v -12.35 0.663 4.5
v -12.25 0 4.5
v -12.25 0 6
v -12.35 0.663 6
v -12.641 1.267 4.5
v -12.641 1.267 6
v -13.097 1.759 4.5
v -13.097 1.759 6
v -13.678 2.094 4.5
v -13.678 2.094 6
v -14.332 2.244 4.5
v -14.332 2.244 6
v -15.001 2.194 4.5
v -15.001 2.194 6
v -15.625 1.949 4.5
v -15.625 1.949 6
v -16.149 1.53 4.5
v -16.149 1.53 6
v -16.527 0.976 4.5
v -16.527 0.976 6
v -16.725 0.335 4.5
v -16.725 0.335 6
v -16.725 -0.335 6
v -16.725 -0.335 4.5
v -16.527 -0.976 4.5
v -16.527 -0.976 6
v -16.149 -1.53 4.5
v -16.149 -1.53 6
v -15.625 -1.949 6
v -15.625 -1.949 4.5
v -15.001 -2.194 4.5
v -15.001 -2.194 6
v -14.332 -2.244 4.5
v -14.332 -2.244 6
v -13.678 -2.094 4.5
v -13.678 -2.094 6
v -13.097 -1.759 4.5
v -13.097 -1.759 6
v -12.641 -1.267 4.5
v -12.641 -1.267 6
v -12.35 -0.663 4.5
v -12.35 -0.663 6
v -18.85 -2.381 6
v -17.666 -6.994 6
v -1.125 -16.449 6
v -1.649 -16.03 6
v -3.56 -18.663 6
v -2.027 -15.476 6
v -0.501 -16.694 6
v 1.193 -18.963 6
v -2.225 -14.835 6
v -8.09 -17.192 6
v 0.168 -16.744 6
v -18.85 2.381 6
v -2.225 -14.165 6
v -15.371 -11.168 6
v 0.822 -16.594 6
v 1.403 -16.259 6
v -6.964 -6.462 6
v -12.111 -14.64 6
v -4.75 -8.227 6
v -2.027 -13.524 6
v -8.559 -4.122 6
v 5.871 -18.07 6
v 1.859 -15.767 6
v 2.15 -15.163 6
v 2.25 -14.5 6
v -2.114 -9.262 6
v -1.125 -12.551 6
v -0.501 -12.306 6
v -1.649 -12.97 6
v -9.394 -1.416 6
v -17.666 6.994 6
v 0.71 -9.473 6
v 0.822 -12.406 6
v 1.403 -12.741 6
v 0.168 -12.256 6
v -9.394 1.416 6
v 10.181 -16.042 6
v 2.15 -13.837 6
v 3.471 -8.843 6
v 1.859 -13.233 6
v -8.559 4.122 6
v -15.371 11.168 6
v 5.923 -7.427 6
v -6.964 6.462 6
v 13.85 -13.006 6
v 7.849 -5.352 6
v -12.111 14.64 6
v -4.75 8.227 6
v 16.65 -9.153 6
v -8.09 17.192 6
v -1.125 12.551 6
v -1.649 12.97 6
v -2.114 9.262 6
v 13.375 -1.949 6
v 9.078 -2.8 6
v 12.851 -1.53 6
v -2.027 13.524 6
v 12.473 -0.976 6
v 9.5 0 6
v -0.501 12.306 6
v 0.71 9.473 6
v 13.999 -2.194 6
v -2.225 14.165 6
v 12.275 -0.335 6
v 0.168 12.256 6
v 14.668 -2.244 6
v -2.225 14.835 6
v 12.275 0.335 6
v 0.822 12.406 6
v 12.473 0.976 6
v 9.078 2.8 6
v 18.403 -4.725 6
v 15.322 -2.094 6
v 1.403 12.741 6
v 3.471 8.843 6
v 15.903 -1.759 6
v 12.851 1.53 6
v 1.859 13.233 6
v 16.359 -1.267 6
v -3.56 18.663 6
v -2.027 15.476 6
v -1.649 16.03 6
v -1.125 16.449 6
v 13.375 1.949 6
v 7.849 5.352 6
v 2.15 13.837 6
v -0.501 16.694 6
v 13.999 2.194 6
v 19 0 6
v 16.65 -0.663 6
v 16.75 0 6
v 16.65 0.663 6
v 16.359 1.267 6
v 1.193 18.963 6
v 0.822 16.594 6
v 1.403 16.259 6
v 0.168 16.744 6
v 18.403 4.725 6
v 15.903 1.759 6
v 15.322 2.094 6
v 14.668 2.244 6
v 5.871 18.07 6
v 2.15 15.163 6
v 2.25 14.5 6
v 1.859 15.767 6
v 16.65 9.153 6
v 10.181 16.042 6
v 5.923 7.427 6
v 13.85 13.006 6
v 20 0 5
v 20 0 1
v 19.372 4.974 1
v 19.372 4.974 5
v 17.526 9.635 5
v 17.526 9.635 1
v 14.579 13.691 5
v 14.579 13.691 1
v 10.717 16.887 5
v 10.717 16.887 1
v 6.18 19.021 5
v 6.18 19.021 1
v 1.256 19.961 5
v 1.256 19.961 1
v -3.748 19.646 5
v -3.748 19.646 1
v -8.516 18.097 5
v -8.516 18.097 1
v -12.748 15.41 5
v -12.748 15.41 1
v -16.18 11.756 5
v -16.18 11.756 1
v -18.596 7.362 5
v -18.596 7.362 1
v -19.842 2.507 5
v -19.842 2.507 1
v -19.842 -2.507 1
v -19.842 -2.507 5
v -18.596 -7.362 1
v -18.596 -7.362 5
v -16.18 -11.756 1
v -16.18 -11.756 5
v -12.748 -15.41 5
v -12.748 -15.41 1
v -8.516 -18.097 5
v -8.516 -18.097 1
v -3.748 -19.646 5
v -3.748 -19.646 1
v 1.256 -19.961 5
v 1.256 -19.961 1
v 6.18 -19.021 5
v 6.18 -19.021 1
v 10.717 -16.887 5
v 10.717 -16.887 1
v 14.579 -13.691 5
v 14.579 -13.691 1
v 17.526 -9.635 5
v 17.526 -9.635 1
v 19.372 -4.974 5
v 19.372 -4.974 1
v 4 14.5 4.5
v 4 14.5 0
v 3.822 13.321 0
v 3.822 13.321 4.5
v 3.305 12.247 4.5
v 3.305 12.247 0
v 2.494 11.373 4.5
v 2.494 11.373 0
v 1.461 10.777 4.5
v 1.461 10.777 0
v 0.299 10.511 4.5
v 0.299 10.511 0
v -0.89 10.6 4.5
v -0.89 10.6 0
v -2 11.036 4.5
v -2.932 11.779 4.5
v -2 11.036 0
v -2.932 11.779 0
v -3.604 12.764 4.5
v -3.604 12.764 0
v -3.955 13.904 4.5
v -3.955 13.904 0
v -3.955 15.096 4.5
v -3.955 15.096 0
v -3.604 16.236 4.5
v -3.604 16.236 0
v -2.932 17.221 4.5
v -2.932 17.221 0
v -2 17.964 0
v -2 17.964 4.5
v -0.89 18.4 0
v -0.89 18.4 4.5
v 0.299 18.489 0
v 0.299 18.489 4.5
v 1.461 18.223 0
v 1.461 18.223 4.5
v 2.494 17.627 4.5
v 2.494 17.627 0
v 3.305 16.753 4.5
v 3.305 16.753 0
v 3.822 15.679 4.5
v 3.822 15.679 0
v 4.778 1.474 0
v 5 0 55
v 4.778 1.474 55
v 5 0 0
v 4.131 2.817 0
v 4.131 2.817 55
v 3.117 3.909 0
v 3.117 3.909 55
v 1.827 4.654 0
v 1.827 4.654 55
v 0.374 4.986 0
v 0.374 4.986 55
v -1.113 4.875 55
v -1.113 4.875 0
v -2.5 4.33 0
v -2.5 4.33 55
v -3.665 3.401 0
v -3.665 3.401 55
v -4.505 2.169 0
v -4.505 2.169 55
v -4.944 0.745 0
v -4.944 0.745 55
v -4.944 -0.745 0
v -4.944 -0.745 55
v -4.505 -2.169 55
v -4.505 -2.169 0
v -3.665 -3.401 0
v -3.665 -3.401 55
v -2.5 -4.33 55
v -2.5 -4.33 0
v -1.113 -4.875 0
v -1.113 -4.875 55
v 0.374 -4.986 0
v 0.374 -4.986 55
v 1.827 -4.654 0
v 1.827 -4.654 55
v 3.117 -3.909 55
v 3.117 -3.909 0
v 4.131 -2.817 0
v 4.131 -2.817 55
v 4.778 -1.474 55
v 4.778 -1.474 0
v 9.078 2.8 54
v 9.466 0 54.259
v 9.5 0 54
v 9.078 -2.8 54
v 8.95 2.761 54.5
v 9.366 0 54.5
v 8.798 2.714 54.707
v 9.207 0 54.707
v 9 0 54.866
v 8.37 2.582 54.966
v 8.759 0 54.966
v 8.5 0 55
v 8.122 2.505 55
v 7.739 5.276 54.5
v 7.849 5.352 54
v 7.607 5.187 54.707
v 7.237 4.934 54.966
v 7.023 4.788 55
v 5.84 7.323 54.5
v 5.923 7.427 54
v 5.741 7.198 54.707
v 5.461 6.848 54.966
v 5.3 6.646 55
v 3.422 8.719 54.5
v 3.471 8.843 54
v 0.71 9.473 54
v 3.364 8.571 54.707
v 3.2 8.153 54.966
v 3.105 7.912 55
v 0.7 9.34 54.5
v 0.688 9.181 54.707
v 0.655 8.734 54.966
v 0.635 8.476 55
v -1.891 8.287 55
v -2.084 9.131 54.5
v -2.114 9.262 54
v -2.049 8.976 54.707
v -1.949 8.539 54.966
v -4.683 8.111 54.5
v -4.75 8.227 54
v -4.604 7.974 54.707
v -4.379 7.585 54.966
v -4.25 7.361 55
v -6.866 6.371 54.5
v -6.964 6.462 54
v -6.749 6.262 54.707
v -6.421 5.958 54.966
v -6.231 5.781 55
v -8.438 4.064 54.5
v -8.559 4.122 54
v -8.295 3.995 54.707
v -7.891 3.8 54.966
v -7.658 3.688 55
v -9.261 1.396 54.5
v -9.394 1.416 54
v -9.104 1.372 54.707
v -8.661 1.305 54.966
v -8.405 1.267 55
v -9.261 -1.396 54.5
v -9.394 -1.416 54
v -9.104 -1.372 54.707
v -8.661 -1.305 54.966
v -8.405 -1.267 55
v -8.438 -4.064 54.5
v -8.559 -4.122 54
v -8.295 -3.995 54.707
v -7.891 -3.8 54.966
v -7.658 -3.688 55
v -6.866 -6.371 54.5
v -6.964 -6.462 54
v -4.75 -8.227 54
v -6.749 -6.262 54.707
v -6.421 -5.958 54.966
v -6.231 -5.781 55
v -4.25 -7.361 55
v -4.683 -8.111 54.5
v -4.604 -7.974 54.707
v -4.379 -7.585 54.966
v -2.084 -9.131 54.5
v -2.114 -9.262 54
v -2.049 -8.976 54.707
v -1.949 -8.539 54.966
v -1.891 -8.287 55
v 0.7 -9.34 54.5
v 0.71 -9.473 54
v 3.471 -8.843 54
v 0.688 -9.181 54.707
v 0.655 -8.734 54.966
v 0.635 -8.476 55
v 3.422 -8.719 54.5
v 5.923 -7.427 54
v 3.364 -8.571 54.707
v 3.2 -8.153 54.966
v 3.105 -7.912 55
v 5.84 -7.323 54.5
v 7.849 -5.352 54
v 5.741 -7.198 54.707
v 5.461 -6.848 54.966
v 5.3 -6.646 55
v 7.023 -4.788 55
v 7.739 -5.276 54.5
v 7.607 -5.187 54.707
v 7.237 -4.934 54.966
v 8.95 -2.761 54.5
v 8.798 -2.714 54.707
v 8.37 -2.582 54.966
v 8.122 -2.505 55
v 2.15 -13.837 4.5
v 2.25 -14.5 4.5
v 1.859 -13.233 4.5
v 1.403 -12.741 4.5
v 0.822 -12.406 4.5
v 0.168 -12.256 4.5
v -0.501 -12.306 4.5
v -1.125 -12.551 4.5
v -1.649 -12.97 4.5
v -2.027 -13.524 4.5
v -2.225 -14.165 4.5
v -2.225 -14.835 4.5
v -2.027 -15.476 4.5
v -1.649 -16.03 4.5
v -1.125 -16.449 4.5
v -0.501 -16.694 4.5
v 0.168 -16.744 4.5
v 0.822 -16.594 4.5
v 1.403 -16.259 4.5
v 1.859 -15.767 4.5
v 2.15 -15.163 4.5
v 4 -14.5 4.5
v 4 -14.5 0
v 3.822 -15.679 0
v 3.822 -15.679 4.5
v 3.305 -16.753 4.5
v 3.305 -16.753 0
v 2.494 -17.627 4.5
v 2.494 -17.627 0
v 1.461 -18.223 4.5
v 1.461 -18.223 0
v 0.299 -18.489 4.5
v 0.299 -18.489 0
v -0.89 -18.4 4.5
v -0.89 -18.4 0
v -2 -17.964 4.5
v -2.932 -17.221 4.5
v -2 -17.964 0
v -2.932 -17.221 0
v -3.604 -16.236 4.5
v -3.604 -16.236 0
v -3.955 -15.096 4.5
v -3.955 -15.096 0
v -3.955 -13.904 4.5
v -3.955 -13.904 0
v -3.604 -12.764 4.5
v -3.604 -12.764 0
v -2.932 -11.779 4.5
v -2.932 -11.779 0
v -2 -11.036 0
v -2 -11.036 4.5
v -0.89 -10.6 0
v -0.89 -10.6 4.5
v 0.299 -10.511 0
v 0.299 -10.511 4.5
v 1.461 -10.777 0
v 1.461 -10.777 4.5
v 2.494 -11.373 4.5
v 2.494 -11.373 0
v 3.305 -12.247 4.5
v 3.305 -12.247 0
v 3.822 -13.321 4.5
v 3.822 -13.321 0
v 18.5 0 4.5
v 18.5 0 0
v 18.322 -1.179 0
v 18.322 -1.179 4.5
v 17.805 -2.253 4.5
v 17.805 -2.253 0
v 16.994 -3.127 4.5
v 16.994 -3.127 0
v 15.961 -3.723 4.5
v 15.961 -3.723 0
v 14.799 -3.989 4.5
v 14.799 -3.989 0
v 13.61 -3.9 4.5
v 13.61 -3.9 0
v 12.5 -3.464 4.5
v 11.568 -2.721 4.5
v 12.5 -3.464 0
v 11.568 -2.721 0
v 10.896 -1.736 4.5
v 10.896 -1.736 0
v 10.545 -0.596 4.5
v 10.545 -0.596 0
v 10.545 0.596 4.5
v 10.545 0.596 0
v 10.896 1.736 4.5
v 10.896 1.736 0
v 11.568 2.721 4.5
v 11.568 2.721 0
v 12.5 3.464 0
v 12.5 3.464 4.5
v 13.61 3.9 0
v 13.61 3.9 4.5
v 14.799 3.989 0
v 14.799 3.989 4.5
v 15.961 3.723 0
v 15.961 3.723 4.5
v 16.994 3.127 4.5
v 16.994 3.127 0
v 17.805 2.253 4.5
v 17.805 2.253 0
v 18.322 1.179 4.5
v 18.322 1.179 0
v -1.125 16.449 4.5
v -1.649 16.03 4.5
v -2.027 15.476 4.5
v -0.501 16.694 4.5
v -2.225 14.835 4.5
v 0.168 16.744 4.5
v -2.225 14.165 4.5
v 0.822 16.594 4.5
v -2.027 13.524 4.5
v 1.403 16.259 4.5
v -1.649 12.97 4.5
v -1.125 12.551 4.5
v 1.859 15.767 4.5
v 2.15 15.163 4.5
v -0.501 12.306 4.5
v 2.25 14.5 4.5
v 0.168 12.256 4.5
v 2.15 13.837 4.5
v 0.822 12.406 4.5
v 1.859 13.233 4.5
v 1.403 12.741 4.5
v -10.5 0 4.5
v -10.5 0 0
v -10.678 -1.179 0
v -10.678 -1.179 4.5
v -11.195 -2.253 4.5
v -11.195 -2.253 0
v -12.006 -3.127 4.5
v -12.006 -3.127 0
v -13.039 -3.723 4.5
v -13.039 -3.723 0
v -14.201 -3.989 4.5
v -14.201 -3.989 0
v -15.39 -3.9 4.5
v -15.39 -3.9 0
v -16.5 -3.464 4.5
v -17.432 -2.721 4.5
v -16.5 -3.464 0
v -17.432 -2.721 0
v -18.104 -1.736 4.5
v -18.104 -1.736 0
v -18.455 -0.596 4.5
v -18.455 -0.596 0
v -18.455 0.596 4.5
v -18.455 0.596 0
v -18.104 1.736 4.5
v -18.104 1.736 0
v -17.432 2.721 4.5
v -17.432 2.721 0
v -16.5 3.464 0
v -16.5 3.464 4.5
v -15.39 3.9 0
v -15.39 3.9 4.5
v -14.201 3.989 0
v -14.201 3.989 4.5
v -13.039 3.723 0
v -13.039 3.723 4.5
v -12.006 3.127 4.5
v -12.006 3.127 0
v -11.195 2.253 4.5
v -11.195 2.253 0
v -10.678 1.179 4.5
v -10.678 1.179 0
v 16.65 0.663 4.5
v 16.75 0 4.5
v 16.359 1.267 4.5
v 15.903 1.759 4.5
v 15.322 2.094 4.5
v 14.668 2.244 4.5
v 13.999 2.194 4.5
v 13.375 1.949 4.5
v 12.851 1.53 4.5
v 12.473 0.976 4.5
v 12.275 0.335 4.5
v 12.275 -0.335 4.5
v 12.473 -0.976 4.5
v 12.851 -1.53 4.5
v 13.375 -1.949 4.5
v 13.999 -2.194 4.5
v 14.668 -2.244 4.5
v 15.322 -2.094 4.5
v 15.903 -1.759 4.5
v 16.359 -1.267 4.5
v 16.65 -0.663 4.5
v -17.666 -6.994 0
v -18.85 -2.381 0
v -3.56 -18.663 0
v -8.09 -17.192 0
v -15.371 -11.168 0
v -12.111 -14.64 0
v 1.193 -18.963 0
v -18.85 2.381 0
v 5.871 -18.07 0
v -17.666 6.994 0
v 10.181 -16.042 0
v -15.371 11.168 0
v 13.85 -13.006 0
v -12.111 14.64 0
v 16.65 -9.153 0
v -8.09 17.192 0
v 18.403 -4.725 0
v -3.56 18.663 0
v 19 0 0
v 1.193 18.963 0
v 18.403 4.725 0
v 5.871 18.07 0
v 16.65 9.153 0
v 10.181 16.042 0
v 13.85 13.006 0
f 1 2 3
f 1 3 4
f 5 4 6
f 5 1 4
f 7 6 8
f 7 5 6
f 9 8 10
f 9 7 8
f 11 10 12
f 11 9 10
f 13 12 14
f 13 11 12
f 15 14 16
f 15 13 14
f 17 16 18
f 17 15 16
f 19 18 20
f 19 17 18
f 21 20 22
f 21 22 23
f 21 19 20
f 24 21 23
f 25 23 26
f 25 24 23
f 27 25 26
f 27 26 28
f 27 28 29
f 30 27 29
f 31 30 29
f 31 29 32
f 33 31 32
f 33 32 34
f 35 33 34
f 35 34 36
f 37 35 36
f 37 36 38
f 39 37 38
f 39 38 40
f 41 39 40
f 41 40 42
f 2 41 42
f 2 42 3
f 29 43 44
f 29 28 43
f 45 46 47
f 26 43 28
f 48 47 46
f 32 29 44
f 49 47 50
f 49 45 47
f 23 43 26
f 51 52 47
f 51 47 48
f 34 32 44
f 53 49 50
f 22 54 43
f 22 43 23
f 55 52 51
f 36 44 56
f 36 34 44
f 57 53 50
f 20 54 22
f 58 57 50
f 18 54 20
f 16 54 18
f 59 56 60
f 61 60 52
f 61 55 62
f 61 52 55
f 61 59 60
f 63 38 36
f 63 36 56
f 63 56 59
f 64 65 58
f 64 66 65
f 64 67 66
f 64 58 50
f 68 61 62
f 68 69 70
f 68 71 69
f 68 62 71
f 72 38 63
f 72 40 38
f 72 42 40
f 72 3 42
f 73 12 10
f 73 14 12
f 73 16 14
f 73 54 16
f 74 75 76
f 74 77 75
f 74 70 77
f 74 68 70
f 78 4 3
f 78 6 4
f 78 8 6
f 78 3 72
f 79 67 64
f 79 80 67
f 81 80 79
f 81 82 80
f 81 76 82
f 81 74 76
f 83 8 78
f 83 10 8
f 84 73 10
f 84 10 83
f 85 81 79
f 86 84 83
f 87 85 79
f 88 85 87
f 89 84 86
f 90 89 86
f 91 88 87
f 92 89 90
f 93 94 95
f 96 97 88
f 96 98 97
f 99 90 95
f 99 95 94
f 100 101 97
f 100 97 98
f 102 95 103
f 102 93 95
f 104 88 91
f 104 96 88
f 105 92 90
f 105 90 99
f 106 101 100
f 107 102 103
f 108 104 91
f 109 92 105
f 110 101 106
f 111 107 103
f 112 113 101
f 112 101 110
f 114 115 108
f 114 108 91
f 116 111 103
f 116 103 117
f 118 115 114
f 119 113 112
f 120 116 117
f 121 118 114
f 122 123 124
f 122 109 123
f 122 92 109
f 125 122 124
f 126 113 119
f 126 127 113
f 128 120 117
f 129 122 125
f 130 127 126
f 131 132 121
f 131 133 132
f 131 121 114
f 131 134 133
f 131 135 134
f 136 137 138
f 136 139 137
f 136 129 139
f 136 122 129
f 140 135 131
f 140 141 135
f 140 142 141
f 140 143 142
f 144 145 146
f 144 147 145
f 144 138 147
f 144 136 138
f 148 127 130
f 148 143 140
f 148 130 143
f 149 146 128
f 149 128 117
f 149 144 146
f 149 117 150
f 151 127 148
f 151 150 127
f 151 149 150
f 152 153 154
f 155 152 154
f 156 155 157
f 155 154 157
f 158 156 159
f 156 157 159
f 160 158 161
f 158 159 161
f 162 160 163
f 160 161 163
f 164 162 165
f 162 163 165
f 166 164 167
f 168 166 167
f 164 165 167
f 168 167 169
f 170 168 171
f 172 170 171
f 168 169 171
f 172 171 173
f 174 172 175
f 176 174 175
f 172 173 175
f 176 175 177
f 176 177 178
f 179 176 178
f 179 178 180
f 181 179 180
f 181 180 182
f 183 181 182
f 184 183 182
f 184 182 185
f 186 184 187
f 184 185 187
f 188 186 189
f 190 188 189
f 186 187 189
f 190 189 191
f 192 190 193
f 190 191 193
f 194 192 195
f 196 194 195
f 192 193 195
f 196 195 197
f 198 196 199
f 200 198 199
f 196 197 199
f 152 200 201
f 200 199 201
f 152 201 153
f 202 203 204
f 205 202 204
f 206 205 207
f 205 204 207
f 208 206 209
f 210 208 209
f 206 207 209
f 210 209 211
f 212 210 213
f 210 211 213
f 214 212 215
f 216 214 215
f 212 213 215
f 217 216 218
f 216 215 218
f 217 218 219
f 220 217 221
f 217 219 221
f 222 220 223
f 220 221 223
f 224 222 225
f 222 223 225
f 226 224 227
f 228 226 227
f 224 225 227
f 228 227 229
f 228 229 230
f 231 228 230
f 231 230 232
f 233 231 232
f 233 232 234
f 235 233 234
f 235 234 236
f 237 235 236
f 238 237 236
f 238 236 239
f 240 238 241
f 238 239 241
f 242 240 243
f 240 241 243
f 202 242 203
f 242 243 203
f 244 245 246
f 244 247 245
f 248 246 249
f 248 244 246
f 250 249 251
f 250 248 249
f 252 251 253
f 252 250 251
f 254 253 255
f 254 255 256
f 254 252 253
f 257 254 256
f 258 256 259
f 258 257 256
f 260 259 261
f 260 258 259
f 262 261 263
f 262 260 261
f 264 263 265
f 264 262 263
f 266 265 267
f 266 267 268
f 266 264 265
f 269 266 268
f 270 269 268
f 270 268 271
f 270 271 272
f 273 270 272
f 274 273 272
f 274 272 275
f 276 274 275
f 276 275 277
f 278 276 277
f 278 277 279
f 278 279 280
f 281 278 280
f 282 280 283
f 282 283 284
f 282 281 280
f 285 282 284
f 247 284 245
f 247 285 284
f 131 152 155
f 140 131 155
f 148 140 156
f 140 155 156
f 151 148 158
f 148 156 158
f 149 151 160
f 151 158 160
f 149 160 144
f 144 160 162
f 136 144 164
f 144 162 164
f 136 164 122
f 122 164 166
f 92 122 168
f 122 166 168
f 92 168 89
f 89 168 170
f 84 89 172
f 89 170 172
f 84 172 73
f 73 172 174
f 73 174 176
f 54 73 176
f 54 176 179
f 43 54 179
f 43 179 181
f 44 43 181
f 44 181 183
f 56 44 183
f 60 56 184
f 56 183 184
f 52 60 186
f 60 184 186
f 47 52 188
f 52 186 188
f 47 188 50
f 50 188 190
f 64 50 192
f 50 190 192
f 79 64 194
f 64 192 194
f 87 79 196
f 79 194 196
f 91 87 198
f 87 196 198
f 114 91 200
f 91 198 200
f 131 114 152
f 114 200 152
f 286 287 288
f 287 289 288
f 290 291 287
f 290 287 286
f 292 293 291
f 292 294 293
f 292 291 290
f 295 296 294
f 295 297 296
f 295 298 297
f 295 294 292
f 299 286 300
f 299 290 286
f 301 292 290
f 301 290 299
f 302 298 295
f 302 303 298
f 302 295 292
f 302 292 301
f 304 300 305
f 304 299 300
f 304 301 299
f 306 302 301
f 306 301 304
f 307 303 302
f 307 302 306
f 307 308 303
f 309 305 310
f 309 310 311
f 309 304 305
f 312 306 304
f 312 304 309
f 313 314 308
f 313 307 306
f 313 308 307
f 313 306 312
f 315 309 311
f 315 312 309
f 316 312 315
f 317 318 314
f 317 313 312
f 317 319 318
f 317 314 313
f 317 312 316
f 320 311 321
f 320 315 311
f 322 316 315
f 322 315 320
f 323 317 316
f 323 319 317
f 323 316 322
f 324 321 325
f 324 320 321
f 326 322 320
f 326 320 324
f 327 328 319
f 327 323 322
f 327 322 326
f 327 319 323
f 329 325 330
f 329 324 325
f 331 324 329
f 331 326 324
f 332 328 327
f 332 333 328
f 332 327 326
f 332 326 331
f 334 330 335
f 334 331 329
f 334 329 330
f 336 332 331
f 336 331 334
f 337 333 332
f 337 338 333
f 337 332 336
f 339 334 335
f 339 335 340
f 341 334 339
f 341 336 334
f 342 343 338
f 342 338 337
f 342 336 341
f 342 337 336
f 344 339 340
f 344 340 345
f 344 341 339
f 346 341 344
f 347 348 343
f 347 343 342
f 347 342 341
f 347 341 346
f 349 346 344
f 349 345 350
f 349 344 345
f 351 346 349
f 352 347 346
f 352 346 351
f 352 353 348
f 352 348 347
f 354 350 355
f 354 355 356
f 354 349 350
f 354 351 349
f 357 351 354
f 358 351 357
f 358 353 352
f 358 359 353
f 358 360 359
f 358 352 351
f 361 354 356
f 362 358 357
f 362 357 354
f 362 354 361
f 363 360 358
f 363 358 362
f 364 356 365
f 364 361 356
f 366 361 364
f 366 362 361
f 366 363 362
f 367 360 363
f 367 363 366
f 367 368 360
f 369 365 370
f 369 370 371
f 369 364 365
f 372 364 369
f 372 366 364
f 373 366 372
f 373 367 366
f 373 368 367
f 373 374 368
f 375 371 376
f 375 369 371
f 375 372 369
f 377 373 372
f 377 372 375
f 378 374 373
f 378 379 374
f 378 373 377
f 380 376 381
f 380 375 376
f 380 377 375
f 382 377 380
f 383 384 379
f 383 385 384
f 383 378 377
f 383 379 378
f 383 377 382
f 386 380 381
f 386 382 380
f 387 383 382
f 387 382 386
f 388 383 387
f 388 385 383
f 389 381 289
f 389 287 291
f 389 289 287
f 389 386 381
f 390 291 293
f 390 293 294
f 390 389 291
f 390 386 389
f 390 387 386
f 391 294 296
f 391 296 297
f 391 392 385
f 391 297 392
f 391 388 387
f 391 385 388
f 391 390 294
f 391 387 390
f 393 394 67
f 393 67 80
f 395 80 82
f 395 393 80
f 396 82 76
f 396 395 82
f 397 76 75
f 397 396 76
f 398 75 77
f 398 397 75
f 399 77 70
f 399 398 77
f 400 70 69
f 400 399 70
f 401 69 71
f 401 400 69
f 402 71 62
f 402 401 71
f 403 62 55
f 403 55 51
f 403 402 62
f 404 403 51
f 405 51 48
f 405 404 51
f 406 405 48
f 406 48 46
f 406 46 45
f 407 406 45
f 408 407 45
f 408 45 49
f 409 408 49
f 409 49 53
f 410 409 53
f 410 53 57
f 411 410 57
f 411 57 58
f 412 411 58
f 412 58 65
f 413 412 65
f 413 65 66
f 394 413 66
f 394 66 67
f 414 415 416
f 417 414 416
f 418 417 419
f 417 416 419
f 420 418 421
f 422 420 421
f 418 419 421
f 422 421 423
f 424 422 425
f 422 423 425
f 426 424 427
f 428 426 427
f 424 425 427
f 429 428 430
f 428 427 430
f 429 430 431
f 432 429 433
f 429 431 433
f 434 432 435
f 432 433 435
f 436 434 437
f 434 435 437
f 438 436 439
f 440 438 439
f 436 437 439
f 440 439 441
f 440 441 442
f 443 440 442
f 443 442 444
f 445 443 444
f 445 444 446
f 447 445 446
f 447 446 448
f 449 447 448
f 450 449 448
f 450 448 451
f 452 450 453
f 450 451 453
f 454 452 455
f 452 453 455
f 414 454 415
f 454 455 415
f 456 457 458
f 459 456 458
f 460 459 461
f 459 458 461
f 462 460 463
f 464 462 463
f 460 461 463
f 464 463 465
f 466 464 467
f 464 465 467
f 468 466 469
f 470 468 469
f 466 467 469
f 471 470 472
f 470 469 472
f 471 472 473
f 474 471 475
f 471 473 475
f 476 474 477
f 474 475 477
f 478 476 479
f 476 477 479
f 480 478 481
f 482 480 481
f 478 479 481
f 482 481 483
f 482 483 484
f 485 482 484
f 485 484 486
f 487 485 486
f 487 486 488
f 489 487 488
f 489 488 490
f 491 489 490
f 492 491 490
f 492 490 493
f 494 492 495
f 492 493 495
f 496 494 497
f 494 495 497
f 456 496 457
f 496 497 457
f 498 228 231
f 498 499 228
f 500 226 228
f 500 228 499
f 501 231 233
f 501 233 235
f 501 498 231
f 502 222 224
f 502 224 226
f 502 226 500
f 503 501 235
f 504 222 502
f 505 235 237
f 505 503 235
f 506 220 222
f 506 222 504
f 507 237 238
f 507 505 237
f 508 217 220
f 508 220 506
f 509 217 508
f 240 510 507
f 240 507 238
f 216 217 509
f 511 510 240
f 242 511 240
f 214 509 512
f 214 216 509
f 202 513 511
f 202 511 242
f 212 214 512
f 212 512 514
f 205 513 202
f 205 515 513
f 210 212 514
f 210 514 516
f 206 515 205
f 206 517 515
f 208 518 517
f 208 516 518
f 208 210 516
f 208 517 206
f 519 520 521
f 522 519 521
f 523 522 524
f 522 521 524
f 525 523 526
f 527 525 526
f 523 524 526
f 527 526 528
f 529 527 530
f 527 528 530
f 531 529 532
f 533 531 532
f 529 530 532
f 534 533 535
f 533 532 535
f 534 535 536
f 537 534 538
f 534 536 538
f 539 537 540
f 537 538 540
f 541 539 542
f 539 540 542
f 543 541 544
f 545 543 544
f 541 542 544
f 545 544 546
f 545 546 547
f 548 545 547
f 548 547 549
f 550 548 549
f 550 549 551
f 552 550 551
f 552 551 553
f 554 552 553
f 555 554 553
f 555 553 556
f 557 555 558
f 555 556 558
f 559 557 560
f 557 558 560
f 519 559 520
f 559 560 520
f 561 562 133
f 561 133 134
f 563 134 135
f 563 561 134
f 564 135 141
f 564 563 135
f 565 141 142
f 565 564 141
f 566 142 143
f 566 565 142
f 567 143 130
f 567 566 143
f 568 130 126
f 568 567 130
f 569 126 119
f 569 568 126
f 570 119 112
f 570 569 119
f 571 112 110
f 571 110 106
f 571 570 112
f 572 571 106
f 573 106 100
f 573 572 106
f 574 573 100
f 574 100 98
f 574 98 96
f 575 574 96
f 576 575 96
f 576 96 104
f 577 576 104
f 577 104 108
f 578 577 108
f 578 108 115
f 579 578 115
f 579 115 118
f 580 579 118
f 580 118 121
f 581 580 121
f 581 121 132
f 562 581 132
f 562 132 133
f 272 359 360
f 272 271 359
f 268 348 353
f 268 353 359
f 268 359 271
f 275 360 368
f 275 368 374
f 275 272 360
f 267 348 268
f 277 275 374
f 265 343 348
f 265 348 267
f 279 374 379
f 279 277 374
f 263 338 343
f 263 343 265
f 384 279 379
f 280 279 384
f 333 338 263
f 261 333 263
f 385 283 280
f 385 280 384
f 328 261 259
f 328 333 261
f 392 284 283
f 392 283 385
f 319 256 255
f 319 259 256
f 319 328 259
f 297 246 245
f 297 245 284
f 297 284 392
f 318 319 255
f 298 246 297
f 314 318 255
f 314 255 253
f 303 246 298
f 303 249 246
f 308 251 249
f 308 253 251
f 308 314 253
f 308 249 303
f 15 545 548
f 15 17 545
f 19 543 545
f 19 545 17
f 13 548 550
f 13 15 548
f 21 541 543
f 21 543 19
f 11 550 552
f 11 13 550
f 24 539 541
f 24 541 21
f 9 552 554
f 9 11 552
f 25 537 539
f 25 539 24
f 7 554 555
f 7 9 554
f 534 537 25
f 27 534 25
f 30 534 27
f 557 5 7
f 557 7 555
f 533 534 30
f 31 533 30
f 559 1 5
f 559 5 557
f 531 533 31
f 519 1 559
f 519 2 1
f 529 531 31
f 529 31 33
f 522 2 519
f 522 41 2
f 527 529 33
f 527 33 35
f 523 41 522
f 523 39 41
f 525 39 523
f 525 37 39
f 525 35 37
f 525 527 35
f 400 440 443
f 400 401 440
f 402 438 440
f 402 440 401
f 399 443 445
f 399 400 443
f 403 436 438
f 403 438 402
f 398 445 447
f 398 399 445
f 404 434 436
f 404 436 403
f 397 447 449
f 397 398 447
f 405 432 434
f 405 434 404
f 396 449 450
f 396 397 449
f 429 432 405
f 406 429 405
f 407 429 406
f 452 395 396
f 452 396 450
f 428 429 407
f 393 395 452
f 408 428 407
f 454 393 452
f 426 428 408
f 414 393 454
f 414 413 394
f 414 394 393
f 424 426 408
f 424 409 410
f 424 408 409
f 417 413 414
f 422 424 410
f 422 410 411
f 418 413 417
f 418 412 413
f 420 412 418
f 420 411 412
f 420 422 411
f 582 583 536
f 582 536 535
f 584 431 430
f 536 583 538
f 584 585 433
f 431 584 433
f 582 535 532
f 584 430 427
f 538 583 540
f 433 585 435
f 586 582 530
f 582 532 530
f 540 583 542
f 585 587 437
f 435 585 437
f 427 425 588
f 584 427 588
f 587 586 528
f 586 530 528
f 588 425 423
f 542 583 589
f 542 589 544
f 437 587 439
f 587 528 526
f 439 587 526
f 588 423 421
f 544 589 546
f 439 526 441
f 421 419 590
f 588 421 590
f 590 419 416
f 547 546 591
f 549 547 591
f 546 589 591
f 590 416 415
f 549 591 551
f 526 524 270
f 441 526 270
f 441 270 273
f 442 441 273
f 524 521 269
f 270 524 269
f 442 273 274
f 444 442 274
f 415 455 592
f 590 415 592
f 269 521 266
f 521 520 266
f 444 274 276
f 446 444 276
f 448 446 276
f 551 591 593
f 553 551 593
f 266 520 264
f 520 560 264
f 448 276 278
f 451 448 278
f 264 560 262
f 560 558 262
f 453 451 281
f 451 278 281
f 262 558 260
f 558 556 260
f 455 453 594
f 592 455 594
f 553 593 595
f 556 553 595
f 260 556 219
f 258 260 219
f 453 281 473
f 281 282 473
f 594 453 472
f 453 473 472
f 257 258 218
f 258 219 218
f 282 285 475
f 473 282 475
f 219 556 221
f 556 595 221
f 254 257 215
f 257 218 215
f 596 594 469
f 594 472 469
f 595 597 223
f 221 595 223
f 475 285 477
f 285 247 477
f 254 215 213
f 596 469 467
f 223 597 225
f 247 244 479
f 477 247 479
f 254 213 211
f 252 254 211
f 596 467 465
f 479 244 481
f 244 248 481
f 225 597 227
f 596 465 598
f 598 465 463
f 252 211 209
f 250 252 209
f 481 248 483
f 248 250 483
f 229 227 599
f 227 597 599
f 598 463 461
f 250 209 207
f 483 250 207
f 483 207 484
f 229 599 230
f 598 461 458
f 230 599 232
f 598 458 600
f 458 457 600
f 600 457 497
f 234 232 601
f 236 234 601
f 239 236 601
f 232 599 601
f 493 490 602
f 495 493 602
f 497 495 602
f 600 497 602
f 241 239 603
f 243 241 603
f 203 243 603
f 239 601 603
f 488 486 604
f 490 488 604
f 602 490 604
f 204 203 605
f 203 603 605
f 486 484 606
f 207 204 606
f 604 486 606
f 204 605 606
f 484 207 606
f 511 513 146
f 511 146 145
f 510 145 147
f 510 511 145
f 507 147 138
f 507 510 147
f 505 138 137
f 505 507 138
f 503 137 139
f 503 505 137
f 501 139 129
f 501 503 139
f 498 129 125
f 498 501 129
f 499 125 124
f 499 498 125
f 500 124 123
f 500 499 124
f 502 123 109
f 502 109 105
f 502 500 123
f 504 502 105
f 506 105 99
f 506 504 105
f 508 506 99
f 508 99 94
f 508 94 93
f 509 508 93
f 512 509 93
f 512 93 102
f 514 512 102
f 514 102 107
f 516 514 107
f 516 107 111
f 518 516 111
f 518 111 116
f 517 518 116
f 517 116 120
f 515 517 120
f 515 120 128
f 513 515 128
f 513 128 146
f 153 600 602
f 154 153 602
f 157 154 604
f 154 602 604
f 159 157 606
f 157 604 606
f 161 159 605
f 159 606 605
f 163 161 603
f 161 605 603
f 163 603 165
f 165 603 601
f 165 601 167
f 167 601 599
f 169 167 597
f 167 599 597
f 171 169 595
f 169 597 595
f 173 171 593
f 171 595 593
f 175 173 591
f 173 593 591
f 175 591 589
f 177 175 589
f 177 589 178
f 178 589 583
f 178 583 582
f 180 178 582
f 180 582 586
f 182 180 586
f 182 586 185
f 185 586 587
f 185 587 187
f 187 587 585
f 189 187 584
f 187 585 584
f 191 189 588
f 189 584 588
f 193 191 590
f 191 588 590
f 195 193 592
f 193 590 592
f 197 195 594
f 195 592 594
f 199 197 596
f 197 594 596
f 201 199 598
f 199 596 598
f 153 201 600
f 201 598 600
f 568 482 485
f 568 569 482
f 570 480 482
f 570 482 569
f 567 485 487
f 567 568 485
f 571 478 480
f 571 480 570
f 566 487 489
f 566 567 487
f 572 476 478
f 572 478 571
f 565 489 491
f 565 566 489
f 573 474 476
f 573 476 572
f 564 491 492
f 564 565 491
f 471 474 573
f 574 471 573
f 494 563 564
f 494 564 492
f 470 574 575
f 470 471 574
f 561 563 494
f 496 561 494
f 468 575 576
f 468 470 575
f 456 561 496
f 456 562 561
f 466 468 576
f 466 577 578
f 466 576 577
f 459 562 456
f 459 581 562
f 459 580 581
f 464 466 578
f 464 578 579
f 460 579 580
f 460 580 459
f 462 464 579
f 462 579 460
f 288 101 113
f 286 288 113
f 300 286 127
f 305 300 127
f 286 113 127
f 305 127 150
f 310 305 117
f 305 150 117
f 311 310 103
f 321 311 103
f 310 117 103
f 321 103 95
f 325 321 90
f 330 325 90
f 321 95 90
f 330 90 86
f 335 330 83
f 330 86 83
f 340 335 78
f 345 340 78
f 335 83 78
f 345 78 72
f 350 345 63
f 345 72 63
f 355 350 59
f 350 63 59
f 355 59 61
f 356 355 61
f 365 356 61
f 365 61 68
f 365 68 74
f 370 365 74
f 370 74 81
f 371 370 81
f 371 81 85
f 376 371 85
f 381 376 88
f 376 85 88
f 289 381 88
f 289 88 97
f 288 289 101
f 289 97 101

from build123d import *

# Parameters (mm, degrees)
F0_R     = 20
F0_R_2   = 2.25
F0_R_3   = 5
F1_DEPTH = 6
F2_R     = 9.5
F2_R_2   = 5
F3_DEPTH = 49
F4_R     = 4
F5_DEPTH = 4.5
F6_SIZE  = 1
F7_R     = 1


with BuildPart() as f1:
    # F0 (on Top) → F1 (new body)
    with BuildSketch(Plane.XY):
        Circle(F0_R)
        with Locations((0, -14.5)):
            Circle(F0_R_2, mode=Mode.SUBTRACT)
        with Locations((-14.5, 0)):
            Circle(F0_R_2, mode=Mode.SUBTRACT)
        Circle(F0_R_3, mode=Mode.SUBTRACT)
        with Locations((14.5, 0)):
            Circle(F0_R_2, mode=Mode.SUBTRACT)
        with Locations((0, 14.5)):
            Circle(F0_R_2, mode=Mode.SUBTRACT)
    extrude(amount=F1_DEPTH)

    # F2 (on face) → F3 (join)
    with BuildSketch(Plane.XY.offset(6)):
        Circle(F2_R)
        Circle(F2_R_2, mode=Mode.SUBTRACT)
    extrude(amount=F3_DEPTH)

    # F4 (on face) → F5 (cut)
    with BuildSketch(Plane(origin=(0, 0, 0), x_dir=(1, 0, 0), z_dir=(0, 0, -1))):
        with Locations((0, 14.5)):
            Circle(F4_R)
        with Locations((14.5, 0)):
            Circle(F4_R)
        with Locations((0, -14.5)):
            Circle(F4_R)
        with Locations((-14.5, 0)):
            Circle(F4_R)
    extrude(amount=-F5_DEPTH, mode=Mode.SUBTRACT)

    # F6
    f6_edges = [f1.edges().sort_by_distance(p)[0] for p in [
        (-20, 0, 0),
        (-20, 0, 6),
    ]]
    chamfer(f6_edges, length=F6_SIZE)

    # F7
    f7_edges = [f1.edges().sort_by_distance(p)[0] for p in [
        (-9.5, 0, 55),
    ]]
    fillet(f7_edges, radius=F7_R)


solid = f1.part
